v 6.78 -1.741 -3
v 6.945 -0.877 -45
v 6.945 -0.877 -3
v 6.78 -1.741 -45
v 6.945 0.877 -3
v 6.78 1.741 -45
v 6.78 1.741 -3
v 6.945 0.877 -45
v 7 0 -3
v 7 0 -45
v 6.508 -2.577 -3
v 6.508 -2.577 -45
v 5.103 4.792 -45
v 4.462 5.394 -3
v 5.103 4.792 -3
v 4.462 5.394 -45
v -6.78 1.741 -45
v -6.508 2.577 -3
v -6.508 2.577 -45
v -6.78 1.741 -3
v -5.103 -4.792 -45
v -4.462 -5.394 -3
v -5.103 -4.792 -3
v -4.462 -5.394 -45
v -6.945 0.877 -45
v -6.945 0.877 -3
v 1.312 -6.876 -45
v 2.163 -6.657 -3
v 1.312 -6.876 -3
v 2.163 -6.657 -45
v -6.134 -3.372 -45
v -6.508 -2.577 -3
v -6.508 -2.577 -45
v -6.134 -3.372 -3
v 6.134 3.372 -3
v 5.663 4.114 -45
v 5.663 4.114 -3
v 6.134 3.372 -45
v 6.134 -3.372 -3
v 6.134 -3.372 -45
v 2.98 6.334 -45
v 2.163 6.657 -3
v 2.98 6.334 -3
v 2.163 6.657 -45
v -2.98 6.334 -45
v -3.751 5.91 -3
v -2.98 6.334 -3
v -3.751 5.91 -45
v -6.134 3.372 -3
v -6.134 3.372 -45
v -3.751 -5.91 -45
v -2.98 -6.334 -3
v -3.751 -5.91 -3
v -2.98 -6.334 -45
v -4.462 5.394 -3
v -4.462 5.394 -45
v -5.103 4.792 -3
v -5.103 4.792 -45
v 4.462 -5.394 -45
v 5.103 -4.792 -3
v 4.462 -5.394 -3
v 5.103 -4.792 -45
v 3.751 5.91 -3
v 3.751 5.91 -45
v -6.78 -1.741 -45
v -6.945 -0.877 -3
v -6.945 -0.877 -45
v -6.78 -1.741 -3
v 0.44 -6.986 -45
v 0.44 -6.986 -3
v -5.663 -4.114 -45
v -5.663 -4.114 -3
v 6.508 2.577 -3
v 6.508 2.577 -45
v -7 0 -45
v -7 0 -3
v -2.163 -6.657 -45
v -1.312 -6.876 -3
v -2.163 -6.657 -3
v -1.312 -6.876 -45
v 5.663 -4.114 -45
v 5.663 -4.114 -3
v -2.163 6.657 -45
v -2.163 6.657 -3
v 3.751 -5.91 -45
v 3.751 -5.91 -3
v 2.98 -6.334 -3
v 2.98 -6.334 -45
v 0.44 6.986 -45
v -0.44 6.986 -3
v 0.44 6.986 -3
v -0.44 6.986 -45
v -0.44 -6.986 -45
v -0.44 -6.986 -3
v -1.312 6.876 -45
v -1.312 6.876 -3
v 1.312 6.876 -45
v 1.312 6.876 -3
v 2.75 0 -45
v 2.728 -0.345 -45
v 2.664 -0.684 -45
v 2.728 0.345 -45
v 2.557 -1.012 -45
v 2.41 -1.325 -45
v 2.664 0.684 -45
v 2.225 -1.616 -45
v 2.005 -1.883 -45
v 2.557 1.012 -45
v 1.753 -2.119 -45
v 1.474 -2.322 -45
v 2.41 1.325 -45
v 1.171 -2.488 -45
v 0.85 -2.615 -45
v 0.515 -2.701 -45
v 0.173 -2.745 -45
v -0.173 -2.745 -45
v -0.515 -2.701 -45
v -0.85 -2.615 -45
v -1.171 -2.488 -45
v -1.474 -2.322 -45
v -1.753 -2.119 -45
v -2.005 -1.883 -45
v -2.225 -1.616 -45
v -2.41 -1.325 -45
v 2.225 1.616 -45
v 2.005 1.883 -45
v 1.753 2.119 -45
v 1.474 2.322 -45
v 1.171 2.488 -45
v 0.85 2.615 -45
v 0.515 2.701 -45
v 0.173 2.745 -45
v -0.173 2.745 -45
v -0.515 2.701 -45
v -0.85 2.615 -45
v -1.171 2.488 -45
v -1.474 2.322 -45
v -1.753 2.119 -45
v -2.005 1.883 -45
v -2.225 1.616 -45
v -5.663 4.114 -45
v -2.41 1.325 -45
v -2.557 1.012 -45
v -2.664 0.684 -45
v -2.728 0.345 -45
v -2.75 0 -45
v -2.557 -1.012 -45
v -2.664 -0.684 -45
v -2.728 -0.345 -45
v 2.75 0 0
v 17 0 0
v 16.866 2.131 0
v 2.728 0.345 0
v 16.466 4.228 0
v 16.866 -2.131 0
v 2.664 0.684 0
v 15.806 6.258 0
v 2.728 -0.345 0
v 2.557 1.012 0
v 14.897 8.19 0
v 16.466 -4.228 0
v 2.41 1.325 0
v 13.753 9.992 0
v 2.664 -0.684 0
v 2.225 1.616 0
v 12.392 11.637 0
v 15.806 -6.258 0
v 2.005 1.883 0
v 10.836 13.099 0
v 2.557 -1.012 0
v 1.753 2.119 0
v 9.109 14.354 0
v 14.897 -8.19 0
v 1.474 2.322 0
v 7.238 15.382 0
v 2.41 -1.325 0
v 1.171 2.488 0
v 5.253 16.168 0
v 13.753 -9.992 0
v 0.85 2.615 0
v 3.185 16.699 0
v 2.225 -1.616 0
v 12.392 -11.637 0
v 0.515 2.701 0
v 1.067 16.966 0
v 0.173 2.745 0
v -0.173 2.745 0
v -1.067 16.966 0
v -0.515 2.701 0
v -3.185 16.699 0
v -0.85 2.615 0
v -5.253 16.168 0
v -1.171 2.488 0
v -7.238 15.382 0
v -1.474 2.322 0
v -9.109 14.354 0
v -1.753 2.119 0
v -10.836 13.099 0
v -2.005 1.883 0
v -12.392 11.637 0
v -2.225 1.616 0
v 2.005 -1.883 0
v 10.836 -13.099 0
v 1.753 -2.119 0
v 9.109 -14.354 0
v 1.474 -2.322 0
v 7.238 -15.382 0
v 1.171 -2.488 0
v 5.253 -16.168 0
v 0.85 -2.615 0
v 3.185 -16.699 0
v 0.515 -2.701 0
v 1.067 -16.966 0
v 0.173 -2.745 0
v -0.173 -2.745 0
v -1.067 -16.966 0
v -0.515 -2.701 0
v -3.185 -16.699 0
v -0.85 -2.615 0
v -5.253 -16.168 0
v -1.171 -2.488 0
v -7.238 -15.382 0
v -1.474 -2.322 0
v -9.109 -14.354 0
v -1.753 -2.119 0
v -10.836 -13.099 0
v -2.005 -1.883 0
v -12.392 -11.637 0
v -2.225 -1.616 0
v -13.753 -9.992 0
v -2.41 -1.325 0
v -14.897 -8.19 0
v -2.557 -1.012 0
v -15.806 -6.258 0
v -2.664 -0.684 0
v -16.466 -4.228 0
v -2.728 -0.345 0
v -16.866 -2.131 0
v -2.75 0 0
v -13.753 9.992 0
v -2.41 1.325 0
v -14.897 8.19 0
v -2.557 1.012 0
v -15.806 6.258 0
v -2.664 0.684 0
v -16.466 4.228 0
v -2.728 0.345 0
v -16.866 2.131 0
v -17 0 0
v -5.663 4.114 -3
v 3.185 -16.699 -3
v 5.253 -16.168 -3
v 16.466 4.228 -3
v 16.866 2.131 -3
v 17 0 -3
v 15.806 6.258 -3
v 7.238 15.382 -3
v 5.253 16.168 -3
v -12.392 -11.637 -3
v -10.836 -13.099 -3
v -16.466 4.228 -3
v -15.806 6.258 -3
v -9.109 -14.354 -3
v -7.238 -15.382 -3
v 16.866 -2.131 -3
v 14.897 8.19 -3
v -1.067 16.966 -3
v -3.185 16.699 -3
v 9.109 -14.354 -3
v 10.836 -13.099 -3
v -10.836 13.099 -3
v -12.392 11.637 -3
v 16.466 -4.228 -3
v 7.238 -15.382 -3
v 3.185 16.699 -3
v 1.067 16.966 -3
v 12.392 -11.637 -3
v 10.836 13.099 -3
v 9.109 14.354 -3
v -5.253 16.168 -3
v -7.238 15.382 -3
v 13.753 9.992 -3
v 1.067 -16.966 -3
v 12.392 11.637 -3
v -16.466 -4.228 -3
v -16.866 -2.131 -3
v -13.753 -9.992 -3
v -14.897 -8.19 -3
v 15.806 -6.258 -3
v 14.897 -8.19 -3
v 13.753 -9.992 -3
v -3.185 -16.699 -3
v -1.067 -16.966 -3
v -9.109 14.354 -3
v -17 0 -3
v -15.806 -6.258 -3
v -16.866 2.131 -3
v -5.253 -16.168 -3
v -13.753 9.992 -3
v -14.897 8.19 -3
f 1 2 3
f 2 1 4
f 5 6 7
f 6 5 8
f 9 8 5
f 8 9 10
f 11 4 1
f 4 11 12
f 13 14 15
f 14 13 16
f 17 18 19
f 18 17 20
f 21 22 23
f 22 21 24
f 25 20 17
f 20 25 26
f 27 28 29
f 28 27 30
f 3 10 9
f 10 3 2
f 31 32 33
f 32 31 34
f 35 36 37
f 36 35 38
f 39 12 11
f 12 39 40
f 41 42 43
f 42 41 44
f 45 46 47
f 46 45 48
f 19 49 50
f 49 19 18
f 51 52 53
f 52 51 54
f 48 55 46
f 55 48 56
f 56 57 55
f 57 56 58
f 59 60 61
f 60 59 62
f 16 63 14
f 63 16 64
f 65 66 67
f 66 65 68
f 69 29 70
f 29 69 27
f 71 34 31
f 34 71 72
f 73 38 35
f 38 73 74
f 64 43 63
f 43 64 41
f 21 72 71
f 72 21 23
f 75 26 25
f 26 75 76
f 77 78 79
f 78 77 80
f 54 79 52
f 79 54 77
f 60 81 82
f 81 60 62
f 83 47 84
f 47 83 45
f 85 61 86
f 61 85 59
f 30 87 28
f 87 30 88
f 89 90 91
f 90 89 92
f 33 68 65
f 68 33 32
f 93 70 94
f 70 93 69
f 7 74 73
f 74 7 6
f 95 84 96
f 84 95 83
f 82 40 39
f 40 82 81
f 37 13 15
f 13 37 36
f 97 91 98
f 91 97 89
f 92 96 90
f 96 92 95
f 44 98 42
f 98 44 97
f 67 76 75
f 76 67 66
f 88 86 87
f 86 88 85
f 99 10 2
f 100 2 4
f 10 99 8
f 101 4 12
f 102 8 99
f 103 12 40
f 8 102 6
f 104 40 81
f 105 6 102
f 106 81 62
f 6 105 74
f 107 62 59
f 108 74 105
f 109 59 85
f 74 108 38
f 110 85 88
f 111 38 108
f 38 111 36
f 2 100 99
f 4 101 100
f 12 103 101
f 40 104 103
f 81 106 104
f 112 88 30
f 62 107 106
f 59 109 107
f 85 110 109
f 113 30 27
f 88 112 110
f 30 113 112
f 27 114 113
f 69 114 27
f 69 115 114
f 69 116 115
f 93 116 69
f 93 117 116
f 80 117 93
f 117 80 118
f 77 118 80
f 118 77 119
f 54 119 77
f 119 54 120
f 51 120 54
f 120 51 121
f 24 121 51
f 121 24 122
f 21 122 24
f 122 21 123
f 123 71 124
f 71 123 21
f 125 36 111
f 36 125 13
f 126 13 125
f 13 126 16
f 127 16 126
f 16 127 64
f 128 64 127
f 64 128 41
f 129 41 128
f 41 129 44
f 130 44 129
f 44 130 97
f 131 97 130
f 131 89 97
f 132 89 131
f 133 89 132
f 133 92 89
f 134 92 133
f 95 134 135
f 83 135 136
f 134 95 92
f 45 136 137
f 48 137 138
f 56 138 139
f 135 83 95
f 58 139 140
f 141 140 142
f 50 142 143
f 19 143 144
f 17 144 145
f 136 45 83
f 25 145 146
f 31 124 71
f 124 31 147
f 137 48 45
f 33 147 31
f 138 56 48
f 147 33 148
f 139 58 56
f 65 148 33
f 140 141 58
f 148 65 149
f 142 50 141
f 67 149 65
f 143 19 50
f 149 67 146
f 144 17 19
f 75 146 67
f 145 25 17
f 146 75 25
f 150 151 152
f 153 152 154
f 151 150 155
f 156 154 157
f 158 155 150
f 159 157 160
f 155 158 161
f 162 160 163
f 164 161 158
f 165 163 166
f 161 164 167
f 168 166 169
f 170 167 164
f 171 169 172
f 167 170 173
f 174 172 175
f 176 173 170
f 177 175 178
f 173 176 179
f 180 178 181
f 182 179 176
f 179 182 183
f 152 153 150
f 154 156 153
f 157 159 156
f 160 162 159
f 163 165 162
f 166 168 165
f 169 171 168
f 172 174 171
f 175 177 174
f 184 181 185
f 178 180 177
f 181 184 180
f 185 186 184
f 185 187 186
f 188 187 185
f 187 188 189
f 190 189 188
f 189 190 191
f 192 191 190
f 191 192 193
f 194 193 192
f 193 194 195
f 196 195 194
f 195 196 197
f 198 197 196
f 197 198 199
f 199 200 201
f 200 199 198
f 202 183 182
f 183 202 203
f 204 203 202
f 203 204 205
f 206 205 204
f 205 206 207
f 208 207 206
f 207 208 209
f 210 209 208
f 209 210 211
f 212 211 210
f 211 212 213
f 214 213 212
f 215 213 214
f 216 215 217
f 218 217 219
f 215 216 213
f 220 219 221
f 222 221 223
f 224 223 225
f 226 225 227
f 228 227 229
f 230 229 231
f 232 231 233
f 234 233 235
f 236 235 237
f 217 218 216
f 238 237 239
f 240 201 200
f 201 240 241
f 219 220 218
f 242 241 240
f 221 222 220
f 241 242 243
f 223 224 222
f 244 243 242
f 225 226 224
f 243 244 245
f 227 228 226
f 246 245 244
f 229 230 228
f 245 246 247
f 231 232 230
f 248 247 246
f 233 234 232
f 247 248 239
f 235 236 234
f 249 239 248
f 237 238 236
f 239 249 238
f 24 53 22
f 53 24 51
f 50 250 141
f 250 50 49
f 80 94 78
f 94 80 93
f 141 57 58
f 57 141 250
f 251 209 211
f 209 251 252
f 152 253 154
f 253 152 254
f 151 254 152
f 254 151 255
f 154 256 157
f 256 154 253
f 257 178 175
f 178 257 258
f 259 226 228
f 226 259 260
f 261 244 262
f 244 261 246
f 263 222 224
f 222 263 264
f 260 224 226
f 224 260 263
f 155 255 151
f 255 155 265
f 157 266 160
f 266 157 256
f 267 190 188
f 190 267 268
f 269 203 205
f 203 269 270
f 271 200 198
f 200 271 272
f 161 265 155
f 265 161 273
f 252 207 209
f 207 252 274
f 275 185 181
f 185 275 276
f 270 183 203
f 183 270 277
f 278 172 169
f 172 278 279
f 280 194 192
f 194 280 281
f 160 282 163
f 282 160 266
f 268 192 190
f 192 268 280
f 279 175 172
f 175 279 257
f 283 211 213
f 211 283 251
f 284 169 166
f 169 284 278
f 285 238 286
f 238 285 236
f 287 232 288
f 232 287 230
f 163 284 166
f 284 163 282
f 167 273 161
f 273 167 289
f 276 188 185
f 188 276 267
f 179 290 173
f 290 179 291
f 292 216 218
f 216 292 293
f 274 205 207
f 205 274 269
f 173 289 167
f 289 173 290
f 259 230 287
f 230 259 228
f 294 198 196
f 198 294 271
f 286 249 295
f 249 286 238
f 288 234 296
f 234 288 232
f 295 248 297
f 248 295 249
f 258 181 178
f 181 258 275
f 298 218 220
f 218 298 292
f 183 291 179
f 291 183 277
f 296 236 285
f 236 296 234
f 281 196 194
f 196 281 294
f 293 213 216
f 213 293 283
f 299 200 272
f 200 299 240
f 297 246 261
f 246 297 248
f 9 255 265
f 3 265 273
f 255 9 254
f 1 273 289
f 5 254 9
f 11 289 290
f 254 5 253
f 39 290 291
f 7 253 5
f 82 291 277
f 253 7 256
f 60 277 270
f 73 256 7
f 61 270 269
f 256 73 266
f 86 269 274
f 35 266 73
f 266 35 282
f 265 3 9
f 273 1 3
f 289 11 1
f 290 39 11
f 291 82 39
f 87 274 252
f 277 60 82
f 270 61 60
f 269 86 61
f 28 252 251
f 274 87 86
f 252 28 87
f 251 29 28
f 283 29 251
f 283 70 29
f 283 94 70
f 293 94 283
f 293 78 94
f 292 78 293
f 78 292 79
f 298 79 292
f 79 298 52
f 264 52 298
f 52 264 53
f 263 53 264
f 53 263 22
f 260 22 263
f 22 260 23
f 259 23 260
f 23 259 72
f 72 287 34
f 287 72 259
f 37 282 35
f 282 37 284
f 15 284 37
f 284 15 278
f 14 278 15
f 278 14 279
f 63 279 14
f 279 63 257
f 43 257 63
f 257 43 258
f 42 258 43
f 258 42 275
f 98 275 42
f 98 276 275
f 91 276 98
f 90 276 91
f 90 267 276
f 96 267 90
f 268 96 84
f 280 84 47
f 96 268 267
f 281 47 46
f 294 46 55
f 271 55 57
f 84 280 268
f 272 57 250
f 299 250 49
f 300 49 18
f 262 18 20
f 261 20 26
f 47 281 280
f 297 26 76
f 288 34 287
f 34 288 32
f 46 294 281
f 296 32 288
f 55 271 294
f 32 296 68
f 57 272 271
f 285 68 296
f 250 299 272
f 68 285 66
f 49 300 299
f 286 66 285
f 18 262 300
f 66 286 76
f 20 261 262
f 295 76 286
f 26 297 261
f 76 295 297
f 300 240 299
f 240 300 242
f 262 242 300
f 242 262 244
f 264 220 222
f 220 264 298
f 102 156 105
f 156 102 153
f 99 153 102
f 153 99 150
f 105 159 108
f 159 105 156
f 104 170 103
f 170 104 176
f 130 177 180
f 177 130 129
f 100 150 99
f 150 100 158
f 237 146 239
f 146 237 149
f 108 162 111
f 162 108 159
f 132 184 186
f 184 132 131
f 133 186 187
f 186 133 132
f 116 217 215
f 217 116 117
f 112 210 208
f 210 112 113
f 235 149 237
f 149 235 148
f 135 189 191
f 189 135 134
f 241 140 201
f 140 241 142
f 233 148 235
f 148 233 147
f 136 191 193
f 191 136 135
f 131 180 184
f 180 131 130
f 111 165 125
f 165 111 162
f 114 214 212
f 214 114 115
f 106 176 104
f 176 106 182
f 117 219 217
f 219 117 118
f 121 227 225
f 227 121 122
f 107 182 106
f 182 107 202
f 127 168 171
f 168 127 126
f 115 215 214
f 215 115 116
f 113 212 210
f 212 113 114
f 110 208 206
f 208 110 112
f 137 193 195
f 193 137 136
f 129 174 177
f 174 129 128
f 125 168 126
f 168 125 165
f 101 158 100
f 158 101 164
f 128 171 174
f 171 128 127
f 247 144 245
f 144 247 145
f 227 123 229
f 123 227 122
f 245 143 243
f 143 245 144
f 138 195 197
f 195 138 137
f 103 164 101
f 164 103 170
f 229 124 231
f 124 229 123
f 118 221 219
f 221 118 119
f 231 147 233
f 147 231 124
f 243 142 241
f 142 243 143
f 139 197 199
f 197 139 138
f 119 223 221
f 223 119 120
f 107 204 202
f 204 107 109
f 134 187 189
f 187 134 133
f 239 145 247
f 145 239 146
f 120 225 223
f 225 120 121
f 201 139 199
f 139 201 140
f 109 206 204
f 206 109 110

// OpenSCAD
$fn = 50;


difference() {
	union() {
		translate(v = [0, 0, -45.0000000000]) {
			cylinder(h = 45, r = 7.0000000000);
		}
		translate(v = [0, 0, -3.0000000000]) {
			cylinder(h = 3, r = 17.0000000000);
		}
	}
	union() {
		#translate(v = [0, 0, -45]) {
			cylinder(h = 45, r = 2.7500000000);
		}
	}
}
